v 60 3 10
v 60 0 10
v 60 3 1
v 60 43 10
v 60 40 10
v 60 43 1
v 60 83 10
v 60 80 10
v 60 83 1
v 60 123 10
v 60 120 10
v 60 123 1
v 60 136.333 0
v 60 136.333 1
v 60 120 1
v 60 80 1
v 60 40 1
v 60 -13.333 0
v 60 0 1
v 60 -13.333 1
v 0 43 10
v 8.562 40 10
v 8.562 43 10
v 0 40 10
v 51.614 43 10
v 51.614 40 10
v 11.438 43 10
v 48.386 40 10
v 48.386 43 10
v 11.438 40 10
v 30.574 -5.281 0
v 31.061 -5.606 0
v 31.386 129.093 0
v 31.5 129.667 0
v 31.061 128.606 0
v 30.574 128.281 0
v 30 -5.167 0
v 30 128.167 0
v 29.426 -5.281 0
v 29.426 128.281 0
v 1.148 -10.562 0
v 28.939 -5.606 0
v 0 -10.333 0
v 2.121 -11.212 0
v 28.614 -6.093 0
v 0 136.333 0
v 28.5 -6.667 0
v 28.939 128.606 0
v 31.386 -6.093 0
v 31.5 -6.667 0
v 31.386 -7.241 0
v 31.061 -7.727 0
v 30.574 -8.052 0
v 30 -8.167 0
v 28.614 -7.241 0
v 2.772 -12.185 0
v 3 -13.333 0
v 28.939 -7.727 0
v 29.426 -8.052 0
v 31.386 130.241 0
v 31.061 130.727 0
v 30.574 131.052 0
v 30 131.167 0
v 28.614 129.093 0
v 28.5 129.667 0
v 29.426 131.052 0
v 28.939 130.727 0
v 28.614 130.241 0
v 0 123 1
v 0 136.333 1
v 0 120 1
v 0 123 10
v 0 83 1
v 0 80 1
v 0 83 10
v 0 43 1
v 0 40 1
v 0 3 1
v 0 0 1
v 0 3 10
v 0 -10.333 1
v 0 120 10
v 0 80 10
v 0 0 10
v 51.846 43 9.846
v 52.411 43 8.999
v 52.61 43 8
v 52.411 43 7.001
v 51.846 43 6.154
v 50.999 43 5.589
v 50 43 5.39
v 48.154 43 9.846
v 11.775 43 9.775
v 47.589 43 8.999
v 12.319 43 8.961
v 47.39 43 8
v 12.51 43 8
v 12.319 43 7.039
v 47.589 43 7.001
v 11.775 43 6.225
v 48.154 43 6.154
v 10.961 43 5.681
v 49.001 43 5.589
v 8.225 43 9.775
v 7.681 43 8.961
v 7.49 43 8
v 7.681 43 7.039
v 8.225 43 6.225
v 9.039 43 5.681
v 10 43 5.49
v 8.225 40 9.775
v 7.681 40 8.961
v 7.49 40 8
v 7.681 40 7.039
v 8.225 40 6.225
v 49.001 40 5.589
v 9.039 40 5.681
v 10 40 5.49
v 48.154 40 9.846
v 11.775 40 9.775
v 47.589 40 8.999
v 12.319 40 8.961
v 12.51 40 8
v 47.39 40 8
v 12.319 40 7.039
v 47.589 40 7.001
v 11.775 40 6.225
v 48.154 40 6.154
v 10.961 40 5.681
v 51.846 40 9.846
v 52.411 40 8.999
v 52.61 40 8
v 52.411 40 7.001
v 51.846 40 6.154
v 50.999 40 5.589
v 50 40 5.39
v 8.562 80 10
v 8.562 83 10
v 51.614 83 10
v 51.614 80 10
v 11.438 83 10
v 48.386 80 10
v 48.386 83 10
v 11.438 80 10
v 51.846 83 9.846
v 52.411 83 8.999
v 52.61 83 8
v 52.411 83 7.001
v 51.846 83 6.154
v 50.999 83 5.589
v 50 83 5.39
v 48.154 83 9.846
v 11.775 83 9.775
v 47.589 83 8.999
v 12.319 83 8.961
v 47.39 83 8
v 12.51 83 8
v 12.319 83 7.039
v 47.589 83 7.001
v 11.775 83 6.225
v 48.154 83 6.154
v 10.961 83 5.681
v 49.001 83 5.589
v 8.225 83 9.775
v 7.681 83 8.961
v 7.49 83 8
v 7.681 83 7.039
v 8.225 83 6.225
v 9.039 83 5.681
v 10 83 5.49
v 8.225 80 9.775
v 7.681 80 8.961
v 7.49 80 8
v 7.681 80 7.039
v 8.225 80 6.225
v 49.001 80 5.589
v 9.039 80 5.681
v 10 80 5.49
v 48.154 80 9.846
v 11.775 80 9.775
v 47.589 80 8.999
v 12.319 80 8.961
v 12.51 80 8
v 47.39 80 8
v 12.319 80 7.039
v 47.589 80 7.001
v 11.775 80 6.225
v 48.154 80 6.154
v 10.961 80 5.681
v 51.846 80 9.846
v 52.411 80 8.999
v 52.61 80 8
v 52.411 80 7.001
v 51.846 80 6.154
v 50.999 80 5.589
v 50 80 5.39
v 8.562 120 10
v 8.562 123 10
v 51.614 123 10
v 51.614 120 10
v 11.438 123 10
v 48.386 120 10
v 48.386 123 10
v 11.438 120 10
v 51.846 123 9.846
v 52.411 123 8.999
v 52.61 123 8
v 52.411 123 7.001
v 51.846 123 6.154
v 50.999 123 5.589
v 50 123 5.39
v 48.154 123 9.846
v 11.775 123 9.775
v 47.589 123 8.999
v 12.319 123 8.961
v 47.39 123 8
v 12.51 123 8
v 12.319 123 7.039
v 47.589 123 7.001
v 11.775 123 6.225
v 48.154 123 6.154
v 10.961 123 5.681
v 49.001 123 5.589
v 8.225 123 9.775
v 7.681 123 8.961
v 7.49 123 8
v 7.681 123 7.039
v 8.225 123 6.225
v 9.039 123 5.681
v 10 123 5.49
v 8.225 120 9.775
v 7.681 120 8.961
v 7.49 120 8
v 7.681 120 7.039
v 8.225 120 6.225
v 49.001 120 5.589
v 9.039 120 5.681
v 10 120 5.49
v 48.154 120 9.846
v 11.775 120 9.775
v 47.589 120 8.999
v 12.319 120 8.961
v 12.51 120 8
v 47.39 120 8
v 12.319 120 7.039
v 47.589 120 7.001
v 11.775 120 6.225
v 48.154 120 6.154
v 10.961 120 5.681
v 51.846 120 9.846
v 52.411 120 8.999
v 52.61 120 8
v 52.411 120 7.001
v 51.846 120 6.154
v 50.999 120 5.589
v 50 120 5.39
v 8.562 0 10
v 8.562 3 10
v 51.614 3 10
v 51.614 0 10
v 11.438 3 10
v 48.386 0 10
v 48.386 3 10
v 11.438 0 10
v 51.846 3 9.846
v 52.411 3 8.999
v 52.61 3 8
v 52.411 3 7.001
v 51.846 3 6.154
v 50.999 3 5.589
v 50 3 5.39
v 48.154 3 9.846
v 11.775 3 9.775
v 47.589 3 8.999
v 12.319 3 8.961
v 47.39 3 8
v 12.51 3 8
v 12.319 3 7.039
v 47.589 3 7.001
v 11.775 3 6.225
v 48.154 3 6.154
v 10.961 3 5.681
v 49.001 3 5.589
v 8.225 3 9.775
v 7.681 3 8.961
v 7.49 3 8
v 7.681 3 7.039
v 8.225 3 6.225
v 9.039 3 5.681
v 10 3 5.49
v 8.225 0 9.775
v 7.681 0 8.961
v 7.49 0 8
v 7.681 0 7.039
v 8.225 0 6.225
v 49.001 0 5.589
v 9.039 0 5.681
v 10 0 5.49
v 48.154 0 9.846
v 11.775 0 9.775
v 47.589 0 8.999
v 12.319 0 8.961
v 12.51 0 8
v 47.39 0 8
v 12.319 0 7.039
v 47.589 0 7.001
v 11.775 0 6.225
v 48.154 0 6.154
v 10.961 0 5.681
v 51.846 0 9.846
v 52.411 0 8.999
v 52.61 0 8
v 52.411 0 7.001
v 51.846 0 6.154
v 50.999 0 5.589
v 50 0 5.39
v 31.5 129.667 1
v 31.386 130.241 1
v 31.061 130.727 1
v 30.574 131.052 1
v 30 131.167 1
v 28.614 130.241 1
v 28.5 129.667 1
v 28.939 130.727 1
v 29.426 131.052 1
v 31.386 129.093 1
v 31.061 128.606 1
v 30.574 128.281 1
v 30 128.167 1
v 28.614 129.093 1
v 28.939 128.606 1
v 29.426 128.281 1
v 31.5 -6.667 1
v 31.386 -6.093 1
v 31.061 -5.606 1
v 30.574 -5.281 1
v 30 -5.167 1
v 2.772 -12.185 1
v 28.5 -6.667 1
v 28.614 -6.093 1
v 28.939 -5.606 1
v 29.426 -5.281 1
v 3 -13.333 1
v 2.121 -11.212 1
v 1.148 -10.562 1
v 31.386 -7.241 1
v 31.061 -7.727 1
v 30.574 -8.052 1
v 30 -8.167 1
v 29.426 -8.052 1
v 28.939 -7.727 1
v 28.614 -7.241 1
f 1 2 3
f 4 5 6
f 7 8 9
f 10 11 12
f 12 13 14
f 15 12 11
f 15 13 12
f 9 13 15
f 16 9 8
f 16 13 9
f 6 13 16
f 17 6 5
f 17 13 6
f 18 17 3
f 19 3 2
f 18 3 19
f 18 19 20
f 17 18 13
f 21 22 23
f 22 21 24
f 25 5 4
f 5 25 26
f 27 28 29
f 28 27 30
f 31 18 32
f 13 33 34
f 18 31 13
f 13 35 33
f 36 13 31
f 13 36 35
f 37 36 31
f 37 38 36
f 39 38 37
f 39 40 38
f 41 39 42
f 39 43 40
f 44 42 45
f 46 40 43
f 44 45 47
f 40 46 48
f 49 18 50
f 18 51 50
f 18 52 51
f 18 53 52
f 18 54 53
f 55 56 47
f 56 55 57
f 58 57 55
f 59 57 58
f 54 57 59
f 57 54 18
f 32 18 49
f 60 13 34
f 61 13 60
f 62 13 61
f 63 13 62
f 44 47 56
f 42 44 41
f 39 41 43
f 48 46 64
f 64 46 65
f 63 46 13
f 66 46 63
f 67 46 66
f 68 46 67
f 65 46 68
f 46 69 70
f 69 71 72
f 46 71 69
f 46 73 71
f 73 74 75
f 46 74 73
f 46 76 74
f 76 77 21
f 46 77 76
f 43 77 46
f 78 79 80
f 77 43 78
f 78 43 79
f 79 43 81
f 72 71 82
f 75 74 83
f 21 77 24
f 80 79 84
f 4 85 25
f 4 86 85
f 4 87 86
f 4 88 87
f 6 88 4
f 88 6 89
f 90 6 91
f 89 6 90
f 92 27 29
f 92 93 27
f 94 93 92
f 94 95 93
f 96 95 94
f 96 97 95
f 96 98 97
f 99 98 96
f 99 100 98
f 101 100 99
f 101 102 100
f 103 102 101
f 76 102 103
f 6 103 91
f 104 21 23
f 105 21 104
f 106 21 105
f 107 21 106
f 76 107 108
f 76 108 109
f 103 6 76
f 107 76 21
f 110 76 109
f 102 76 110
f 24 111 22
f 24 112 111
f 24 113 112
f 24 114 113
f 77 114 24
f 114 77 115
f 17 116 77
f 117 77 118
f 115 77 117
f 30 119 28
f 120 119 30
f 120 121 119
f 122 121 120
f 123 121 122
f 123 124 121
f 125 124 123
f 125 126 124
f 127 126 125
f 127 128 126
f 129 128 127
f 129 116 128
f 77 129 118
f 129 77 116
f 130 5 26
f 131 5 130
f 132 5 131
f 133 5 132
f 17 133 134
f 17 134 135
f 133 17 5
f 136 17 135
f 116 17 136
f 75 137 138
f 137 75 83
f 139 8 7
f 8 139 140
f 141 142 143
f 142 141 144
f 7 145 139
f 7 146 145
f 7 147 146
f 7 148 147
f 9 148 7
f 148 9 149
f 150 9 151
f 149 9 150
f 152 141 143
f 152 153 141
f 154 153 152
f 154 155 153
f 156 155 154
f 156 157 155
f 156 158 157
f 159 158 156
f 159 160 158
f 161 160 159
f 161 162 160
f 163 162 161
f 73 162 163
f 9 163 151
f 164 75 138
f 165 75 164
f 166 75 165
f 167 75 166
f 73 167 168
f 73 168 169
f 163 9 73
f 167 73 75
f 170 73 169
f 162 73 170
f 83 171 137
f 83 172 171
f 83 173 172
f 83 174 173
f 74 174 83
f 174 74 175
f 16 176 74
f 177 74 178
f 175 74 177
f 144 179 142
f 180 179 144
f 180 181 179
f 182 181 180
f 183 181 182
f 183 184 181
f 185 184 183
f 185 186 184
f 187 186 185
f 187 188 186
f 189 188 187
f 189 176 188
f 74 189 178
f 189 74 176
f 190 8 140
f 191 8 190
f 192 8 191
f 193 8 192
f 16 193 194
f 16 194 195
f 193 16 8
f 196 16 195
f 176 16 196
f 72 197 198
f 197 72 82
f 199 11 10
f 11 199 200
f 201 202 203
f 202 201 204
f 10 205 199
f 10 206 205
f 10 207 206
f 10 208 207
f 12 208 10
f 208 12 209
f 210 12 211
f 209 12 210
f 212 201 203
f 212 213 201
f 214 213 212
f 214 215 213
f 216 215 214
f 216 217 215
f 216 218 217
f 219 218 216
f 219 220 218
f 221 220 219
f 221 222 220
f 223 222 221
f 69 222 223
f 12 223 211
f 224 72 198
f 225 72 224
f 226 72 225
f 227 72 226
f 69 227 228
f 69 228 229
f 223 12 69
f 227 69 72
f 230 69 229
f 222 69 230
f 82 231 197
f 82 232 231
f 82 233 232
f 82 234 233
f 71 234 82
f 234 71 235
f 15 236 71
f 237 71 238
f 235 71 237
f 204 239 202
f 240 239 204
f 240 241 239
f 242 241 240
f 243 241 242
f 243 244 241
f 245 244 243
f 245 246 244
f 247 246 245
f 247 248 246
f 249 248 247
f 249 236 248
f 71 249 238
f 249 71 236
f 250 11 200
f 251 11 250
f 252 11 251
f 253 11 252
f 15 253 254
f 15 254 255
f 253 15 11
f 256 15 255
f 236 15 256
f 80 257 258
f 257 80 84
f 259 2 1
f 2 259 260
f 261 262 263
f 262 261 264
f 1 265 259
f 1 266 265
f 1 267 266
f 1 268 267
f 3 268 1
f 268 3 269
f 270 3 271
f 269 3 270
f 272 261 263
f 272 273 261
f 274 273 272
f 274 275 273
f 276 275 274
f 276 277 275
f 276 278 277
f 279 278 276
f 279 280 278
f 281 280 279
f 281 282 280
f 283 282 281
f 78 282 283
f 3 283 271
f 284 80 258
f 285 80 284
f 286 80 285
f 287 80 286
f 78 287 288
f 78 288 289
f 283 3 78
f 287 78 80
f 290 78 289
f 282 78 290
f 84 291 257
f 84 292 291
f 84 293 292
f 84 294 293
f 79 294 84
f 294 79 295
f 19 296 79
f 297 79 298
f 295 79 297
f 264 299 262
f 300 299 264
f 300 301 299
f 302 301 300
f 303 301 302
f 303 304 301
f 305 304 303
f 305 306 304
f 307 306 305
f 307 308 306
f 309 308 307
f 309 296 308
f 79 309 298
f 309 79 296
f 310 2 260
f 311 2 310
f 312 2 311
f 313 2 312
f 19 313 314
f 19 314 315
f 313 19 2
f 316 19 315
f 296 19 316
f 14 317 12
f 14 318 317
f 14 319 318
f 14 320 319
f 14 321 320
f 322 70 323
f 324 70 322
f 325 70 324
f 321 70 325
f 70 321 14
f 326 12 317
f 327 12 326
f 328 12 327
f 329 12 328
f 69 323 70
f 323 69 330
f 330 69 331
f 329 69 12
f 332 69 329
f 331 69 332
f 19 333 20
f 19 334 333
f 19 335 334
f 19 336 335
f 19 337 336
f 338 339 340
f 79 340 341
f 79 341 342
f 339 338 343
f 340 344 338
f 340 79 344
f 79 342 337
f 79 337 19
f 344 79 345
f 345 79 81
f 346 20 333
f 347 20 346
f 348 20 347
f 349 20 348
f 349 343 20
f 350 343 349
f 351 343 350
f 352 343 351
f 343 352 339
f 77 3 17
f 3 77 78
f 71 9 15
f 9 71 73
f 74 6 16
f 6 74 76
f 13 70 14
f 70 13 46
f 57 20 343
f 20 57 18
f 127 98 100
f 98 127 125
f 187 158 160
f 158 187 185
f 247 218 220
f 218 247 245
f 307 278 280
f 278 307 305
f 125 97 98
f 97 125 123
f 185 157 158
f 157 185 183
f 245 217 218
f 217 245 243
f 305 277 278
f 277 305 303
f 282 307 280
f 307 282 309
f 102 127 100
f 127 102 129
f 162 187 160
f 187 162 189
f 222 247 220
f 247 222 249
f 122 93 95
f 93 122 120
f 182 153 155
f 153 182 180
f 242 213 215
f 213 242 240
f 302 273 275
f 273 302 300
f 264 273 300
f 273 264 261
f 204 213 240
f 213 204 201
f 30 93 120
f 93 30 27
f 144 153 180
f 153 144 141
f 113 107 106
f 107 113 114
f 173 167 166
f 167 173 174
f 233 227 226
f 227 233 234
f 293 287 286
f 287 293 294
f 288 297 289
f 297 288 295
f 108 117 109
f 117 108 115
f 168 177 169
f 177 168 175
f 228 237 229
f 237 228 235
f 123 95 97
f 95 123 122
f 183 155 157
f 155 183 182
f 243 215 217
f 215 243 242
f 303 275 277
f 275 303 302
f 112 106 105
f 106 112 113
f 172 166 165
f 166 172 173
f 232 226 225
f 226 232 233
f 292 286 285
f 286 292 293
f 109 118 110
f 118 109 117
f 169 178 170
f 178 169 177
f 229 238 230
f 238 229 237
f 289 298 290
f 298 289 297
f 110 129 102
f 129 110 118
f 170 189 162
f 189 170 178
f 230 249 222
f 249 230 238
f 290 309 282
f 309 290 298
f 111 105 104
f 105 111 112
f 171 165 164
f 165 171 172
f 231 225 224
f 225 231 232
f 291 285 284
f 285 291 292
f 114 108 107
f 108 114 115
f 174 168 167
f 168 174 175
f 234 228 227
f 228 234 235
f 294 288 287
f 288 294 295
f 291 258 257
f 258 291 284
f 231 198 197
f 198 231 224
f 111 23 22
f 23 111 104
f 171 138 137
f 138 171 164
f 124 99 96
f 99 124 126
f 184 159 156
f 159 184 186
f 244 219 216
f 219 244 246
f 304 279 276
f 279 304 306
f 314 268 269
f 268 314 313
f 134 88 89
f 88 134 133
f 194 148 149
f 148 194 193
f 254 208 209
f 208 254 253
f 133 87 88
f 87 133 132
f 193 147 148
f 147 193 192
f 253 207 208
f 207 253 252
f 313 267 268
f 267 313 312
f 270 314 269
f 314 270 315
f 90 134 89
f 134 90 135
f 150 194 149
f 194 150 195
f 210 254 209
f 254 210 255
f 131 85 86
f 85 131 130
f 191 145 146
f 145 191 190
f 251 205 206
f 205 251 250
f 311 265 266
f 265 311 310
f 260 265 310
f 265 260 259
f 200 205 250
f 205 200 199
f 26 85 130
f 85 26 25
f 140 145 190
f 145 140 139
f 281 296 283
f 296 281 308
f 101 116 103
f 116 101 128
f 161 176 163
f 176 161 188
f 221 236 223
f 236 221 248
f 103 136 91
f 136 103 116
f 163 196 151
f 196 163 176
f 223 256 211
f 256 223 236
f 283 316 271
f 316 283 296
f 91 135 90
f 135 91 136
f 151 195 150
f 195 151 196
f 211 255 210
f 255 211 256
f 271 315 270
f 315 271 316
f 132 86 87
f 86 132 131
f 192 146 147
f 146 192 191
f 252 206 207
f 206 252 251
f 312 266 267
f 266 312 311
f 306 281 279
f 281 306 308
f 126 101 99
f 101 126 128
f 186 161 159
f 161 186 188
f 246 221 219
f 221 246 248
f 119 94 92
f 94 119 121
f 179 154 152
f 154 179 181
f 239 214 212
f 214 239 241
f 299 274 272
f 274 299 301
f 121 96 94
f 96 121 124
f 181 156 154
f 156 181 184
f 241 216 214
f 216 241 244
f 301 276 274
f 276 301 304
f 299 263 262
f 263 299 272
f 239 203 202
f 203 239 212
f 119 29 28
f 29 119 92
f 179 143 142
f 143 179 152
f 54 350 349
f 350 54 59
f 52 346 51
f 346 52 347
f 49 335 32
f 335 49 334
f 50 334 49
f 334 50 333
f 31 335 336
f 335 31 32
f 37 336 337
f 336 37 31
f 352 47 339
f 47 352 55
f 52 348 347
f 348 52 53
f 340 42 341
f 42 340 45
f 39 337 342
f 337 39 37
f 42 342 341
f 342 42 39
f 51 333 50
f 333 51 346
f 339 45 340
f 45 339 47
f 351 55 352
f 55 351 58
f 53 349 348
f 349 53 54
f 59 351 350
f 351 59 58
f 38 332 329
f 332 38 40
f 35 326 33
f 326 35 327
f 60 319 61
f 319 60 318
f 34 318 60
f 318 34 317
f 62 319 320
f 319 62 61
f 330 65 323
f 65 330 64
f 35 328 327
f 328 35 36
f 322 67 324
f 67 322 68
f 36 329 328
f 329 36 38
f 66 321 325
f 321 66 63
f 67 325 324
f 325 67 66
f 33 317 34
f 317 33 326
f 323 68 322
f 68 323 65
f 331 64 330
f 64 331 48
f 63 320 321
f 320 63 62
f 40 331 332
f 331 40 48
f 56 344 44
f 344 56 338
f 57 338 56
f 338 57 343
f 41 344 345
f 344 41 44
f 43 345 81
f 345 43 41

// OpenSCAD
// Wall Parameters
wallCount = 4; // Total number of vertical walls
wallWidth = 60;
wallHeight = 10;
wallDepth = 3;
wallSeparation = 40;
floorHeight = 1;

// Hole Parameters
holeR = (4.92 / 2.0) + 0.05;
holeL = (wallSeparation+wallDepth+wallDepth)*wallCount + 2;
holeXOffset = (wallWidth - wallSeparation) / 2;
holeZoffset = 8; // How high should the LED holes be?
holeRightFudge = 0.10; // my printer prints this hole too small

// Mounting wings Parameters
mountWing = wallSeparation/3; // How deep
mountingScrewHoleR=1.5;

// Computed variables
wallMax = wallCount - 1;

$fn=16; // higher # means smoother cylinders

module Wall()
{
	union()
	{
		// Front Wall -- Always printed
		cube([wallWidth, wallDepth, wallHeight]);

		// Back Walls -- Print as many as requested
		for (n=[1:wallMax])
		{
			translate([0,wallSeparation*n,0]) cube([wallWidth, wallDepth, wallHeight]);
		}

		// Floor and mounting wings
		translate([0,-mountWing,0])
		cube([wallWidth, wallMax*wallSeparation + wallDepth + 2*mountWing, floorHeight]);
	}
}

module LEDHolePuncher()
{
	// Left hole
	translate([holeXOffset,-wallDepth,holeZoffset])
		rotate([-90,0,0])
			cylinder(h=holeL, r=holeR);

	// Right hole
	translate([wallWidth-holeXOffset,-wallDepth,holeZoffset])
		rotate([-90,0,0])
			cylinder(h=holeL, r=holeR+holeRightFudge);
}

module MountingHoles()
{
	// Front mount holes
	translate([wallWidth/2,-wallSeparation/6,0])
		cylinder(h=floorHeight,r=mountingScrewHoleR);

	// Rear mount holes
	translate([wallWidth/2,(wallMax*wallSeparation)+ wallDepth +(wallSeparation/6),0])
		cylinder(h=floorHeight,r=mountingScrewHoleR);
}

module Indicator()
{
	translate([0,-wallSeparation/3,0])
		cylinder(h=floorHeight,r=3);
}

module Jig()
{
	difference()
	{
		Wall();
		LEDHolePuncher();
		MountingHoles();
		Indicator(); // Indicate which side is nearest origin in case we need to make adjustments then we'll know which hole is which.
	}
}

Jig();
